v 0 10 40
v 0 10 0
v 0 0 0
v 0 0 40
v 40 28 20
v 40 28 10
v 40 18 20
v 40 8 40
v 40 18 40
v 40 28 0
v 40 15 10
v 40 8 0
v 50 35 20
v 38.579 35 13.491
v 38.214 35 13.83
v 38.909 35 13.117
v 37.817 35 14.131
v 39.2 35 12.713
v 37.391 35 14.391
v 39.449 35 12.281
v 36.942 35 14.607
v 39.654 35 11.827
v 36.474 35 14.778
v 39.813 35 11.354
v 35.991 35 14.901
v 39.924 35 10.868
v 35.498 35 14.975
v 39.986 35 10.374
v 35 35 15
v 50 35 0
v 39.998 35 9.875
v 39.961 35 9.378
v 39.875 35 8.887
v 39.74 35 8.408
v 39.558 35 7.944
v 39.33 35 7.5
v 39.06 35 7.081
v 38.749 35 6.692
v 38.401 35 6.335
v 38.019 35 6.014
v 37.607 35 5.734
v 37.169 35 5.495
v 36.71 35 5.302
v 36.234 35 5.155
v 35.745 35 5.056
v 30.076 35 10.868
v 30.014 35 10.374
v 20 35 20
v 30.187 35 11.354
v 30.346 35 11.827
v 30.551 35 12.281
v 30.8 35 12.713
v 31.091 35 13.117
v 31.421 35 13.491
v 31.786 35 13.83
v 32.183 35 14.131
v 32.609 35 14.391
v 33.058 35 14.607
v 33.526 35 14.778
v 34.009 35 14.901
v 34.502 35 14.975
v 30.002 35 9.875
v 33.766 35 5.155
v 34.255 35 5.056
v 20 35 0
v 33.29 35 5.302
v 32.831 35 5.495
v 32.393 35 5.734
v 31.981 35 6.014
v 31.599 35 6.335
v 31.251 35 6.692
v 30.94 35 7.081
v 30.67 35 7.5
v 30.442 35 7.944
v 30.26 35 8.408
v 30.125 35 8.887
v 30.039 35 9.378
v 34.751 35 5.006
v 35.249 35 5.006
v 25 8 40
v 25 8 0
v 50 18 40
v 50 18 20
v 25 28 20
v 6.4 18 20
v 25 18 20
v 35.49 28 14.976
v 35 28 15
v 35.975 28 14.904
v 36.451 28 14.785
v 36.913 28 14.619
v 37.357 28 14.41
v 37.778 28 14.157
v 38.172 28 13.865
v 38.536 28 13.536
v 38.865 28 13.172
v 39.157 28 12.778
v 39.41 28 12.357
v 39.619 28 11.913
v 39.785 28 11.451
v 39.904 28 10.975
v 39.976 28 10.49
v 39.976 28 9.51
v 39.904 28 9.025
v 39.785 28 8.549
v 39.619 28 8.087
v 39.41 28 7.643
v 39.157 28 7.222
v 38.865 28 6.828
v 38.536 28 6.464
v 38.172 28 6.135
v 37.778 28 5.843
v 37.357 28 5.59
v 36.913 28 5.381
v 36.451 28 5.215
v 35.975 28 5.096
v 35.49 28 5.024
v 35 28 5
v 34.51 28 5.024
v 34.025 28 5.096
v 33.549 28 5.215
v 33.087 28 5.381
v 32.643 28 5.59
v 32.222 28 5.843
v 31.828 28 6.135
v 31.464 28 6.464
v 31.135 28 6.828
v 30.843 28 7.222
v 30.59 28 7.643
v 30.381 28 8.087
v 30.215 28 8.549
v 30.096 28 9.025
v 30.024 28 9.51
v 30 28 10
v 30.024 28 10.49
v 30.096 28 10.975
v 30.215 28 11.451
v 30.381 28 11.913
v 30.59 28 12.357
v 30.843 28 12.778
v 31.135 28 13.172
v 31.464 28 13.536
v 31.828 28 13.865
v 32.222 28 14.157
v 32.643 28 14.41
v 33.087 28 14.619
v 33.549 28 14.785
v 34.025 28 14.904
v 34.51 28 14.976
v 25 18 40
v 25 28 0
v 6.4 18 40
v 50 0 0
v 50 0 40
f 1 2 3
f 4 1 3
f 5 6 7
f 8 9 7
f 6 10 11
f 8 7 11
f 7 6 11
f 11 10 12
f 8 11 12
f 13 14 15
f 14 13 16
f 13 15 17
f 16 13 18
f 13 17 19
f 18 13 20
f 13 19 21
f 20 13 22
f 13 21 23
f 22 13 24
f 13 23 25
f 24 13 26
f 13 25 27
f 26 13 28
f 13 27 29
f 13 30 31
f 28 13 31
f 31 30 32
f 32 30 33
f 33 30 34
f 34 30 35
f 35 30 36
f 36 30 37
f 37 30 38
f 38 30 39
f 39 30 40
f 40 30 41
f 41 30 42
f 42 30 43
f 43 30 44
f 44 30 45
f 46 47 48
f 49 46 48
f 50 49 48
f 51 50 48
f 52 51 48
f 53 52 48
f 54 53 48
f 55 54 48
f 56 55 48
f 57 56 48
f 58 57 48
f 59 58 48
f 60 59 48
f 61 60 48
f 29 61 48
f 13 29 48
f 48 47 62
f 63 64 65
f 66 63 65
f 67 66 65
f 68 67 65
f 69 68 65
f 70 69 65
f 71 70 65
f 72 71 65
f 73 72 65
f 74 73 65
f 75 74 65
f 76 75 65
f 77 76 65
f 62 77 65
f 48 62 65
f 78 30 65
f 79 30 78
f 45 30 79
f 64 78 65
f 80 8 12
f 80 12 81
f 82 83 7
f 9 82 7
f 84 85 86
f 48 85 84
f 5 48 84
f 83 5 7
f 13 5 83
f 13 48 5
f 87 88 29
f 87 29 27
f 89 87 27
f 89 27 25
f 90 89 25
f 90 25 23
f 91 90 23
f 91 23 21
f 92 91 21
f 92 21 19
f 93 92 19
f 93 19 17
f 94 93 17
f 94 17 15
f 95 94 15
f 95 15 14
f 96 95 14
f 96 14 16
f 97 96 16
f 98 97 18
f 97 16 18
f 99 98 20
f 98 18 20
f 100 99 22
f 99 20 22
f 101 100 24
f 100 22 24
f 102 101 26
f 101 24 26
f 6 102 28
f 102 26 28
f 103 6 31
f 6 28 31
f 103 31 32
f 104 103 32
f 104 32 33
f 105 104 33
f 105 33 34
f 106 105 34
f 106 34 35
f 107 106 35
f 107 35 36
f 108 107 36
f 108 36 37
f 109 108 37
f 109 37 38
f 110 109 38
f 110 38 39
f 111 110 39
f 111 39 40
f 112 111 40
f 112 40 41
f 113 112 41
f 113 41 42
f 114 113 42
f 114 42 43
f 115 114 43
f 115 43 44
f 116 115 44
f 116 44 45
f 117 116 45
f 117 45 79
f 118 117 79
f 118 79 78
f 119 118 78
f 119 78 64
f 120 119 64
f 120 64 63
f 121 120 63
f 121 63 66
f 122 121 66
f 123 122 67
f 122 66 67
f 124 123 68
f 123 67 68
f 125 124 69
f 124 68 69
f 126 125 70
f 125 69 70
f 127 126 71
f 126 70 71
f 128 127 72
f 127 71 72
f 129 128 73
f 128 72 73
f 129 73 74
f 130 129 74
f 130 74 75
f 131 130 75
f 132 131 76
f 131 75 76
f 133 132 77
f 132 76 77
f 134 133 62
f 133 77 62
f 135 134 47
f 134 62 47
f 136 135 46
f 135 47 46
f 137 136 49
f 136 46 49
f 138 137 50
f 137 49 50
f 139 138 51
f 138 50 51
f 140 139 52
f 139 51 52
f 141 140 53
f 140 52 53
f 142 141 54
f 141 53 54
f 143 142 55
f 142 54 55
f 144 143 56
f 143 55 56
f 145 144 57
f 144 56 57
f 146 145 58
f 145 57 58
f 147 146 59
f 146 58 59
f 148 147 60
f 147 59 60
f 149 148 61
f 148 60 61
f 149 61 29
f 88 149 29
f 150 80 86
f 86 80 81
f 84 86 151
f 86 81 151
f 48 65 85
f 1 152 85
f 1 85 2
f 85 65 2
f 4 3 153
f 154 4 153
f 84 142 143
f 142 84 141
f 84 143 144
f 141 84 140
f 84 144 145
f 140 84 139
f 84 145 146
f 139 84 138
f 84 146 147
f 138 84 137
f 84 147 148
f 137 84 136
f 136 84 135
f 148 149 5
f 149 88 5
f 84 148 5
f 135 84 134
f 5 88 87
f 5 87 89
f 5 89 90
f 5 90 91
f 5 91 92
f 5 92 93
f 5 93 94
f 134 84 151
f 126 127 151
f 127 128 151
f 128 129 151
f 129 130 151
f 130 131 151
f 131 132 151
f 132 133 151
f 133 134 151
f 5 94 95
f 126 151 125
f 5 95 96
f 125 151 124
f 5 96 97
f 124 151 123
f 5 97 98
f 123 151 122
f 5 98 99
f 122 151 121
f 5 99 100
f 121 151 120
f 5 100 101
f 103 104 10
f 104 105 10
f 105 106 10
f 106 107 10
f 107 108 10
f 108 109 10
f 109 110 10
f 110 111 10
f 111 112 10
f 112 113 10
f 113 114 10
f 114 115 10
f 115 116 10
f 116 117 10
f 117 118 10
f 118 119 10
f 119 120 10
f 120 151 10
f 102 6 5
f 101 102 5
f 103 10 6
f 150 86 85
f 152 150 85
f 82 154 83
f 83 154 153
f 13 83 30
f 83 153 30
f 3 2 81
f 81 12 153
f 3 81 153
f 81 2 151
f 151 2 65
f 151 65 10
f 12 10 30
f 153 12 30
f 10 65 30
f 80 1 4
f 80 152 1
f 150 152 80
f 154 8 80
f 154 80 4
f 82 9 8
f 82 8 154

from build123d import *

# Parameters (mm, degrees)
BOSS_EXTRUDE1_DEPTH = 40
BOSS_EXTRUDE2_DEPTH = 20
SKETCH4_R           = 5
CUT_EXTRUDE3_DEPTH  = 20


with BuildPart() as part:
    # Sketch2 → Boss-Extrude1 (new body)
    with BuildSketch(Plane.XY):
        Polygon((0, 10), (0, 0), (50, 0), (50, 18), (40, 18), (40, 8), (25, 8), (25, 18), (6.4, 18), align=None)
    extrude(amount=BOSS_EXTRUDE1_DEPTH)

    # Sketch2<4> → Boss-Extrude2 (add)
    with BuildSketch(Plane.XY):
        Polygon((20, 35), (6.4, 18), (25, 18), (25, 28), (40, 28), (40, 18), (50, 18), (50, 35), align=None)
    extrude(amount=BOSS_EXTRUDE2_DEPTH)

    # Sketch4 → Cut-Extrude3 (cut)
    with BuildSketch(Plane(origin=(0, 35, 0), x_dir=(1, 0, 0), z_dir=(0, 1, 0))):
        with Locations(Location((35, -10, 0), (0, 0, 270))):
            Circle(SKETCH4_R)
    extrude(amount=-CUT_EXTRUDE3_DEPTH, mode=Mode.SUBTRACT)


solid = part.part
